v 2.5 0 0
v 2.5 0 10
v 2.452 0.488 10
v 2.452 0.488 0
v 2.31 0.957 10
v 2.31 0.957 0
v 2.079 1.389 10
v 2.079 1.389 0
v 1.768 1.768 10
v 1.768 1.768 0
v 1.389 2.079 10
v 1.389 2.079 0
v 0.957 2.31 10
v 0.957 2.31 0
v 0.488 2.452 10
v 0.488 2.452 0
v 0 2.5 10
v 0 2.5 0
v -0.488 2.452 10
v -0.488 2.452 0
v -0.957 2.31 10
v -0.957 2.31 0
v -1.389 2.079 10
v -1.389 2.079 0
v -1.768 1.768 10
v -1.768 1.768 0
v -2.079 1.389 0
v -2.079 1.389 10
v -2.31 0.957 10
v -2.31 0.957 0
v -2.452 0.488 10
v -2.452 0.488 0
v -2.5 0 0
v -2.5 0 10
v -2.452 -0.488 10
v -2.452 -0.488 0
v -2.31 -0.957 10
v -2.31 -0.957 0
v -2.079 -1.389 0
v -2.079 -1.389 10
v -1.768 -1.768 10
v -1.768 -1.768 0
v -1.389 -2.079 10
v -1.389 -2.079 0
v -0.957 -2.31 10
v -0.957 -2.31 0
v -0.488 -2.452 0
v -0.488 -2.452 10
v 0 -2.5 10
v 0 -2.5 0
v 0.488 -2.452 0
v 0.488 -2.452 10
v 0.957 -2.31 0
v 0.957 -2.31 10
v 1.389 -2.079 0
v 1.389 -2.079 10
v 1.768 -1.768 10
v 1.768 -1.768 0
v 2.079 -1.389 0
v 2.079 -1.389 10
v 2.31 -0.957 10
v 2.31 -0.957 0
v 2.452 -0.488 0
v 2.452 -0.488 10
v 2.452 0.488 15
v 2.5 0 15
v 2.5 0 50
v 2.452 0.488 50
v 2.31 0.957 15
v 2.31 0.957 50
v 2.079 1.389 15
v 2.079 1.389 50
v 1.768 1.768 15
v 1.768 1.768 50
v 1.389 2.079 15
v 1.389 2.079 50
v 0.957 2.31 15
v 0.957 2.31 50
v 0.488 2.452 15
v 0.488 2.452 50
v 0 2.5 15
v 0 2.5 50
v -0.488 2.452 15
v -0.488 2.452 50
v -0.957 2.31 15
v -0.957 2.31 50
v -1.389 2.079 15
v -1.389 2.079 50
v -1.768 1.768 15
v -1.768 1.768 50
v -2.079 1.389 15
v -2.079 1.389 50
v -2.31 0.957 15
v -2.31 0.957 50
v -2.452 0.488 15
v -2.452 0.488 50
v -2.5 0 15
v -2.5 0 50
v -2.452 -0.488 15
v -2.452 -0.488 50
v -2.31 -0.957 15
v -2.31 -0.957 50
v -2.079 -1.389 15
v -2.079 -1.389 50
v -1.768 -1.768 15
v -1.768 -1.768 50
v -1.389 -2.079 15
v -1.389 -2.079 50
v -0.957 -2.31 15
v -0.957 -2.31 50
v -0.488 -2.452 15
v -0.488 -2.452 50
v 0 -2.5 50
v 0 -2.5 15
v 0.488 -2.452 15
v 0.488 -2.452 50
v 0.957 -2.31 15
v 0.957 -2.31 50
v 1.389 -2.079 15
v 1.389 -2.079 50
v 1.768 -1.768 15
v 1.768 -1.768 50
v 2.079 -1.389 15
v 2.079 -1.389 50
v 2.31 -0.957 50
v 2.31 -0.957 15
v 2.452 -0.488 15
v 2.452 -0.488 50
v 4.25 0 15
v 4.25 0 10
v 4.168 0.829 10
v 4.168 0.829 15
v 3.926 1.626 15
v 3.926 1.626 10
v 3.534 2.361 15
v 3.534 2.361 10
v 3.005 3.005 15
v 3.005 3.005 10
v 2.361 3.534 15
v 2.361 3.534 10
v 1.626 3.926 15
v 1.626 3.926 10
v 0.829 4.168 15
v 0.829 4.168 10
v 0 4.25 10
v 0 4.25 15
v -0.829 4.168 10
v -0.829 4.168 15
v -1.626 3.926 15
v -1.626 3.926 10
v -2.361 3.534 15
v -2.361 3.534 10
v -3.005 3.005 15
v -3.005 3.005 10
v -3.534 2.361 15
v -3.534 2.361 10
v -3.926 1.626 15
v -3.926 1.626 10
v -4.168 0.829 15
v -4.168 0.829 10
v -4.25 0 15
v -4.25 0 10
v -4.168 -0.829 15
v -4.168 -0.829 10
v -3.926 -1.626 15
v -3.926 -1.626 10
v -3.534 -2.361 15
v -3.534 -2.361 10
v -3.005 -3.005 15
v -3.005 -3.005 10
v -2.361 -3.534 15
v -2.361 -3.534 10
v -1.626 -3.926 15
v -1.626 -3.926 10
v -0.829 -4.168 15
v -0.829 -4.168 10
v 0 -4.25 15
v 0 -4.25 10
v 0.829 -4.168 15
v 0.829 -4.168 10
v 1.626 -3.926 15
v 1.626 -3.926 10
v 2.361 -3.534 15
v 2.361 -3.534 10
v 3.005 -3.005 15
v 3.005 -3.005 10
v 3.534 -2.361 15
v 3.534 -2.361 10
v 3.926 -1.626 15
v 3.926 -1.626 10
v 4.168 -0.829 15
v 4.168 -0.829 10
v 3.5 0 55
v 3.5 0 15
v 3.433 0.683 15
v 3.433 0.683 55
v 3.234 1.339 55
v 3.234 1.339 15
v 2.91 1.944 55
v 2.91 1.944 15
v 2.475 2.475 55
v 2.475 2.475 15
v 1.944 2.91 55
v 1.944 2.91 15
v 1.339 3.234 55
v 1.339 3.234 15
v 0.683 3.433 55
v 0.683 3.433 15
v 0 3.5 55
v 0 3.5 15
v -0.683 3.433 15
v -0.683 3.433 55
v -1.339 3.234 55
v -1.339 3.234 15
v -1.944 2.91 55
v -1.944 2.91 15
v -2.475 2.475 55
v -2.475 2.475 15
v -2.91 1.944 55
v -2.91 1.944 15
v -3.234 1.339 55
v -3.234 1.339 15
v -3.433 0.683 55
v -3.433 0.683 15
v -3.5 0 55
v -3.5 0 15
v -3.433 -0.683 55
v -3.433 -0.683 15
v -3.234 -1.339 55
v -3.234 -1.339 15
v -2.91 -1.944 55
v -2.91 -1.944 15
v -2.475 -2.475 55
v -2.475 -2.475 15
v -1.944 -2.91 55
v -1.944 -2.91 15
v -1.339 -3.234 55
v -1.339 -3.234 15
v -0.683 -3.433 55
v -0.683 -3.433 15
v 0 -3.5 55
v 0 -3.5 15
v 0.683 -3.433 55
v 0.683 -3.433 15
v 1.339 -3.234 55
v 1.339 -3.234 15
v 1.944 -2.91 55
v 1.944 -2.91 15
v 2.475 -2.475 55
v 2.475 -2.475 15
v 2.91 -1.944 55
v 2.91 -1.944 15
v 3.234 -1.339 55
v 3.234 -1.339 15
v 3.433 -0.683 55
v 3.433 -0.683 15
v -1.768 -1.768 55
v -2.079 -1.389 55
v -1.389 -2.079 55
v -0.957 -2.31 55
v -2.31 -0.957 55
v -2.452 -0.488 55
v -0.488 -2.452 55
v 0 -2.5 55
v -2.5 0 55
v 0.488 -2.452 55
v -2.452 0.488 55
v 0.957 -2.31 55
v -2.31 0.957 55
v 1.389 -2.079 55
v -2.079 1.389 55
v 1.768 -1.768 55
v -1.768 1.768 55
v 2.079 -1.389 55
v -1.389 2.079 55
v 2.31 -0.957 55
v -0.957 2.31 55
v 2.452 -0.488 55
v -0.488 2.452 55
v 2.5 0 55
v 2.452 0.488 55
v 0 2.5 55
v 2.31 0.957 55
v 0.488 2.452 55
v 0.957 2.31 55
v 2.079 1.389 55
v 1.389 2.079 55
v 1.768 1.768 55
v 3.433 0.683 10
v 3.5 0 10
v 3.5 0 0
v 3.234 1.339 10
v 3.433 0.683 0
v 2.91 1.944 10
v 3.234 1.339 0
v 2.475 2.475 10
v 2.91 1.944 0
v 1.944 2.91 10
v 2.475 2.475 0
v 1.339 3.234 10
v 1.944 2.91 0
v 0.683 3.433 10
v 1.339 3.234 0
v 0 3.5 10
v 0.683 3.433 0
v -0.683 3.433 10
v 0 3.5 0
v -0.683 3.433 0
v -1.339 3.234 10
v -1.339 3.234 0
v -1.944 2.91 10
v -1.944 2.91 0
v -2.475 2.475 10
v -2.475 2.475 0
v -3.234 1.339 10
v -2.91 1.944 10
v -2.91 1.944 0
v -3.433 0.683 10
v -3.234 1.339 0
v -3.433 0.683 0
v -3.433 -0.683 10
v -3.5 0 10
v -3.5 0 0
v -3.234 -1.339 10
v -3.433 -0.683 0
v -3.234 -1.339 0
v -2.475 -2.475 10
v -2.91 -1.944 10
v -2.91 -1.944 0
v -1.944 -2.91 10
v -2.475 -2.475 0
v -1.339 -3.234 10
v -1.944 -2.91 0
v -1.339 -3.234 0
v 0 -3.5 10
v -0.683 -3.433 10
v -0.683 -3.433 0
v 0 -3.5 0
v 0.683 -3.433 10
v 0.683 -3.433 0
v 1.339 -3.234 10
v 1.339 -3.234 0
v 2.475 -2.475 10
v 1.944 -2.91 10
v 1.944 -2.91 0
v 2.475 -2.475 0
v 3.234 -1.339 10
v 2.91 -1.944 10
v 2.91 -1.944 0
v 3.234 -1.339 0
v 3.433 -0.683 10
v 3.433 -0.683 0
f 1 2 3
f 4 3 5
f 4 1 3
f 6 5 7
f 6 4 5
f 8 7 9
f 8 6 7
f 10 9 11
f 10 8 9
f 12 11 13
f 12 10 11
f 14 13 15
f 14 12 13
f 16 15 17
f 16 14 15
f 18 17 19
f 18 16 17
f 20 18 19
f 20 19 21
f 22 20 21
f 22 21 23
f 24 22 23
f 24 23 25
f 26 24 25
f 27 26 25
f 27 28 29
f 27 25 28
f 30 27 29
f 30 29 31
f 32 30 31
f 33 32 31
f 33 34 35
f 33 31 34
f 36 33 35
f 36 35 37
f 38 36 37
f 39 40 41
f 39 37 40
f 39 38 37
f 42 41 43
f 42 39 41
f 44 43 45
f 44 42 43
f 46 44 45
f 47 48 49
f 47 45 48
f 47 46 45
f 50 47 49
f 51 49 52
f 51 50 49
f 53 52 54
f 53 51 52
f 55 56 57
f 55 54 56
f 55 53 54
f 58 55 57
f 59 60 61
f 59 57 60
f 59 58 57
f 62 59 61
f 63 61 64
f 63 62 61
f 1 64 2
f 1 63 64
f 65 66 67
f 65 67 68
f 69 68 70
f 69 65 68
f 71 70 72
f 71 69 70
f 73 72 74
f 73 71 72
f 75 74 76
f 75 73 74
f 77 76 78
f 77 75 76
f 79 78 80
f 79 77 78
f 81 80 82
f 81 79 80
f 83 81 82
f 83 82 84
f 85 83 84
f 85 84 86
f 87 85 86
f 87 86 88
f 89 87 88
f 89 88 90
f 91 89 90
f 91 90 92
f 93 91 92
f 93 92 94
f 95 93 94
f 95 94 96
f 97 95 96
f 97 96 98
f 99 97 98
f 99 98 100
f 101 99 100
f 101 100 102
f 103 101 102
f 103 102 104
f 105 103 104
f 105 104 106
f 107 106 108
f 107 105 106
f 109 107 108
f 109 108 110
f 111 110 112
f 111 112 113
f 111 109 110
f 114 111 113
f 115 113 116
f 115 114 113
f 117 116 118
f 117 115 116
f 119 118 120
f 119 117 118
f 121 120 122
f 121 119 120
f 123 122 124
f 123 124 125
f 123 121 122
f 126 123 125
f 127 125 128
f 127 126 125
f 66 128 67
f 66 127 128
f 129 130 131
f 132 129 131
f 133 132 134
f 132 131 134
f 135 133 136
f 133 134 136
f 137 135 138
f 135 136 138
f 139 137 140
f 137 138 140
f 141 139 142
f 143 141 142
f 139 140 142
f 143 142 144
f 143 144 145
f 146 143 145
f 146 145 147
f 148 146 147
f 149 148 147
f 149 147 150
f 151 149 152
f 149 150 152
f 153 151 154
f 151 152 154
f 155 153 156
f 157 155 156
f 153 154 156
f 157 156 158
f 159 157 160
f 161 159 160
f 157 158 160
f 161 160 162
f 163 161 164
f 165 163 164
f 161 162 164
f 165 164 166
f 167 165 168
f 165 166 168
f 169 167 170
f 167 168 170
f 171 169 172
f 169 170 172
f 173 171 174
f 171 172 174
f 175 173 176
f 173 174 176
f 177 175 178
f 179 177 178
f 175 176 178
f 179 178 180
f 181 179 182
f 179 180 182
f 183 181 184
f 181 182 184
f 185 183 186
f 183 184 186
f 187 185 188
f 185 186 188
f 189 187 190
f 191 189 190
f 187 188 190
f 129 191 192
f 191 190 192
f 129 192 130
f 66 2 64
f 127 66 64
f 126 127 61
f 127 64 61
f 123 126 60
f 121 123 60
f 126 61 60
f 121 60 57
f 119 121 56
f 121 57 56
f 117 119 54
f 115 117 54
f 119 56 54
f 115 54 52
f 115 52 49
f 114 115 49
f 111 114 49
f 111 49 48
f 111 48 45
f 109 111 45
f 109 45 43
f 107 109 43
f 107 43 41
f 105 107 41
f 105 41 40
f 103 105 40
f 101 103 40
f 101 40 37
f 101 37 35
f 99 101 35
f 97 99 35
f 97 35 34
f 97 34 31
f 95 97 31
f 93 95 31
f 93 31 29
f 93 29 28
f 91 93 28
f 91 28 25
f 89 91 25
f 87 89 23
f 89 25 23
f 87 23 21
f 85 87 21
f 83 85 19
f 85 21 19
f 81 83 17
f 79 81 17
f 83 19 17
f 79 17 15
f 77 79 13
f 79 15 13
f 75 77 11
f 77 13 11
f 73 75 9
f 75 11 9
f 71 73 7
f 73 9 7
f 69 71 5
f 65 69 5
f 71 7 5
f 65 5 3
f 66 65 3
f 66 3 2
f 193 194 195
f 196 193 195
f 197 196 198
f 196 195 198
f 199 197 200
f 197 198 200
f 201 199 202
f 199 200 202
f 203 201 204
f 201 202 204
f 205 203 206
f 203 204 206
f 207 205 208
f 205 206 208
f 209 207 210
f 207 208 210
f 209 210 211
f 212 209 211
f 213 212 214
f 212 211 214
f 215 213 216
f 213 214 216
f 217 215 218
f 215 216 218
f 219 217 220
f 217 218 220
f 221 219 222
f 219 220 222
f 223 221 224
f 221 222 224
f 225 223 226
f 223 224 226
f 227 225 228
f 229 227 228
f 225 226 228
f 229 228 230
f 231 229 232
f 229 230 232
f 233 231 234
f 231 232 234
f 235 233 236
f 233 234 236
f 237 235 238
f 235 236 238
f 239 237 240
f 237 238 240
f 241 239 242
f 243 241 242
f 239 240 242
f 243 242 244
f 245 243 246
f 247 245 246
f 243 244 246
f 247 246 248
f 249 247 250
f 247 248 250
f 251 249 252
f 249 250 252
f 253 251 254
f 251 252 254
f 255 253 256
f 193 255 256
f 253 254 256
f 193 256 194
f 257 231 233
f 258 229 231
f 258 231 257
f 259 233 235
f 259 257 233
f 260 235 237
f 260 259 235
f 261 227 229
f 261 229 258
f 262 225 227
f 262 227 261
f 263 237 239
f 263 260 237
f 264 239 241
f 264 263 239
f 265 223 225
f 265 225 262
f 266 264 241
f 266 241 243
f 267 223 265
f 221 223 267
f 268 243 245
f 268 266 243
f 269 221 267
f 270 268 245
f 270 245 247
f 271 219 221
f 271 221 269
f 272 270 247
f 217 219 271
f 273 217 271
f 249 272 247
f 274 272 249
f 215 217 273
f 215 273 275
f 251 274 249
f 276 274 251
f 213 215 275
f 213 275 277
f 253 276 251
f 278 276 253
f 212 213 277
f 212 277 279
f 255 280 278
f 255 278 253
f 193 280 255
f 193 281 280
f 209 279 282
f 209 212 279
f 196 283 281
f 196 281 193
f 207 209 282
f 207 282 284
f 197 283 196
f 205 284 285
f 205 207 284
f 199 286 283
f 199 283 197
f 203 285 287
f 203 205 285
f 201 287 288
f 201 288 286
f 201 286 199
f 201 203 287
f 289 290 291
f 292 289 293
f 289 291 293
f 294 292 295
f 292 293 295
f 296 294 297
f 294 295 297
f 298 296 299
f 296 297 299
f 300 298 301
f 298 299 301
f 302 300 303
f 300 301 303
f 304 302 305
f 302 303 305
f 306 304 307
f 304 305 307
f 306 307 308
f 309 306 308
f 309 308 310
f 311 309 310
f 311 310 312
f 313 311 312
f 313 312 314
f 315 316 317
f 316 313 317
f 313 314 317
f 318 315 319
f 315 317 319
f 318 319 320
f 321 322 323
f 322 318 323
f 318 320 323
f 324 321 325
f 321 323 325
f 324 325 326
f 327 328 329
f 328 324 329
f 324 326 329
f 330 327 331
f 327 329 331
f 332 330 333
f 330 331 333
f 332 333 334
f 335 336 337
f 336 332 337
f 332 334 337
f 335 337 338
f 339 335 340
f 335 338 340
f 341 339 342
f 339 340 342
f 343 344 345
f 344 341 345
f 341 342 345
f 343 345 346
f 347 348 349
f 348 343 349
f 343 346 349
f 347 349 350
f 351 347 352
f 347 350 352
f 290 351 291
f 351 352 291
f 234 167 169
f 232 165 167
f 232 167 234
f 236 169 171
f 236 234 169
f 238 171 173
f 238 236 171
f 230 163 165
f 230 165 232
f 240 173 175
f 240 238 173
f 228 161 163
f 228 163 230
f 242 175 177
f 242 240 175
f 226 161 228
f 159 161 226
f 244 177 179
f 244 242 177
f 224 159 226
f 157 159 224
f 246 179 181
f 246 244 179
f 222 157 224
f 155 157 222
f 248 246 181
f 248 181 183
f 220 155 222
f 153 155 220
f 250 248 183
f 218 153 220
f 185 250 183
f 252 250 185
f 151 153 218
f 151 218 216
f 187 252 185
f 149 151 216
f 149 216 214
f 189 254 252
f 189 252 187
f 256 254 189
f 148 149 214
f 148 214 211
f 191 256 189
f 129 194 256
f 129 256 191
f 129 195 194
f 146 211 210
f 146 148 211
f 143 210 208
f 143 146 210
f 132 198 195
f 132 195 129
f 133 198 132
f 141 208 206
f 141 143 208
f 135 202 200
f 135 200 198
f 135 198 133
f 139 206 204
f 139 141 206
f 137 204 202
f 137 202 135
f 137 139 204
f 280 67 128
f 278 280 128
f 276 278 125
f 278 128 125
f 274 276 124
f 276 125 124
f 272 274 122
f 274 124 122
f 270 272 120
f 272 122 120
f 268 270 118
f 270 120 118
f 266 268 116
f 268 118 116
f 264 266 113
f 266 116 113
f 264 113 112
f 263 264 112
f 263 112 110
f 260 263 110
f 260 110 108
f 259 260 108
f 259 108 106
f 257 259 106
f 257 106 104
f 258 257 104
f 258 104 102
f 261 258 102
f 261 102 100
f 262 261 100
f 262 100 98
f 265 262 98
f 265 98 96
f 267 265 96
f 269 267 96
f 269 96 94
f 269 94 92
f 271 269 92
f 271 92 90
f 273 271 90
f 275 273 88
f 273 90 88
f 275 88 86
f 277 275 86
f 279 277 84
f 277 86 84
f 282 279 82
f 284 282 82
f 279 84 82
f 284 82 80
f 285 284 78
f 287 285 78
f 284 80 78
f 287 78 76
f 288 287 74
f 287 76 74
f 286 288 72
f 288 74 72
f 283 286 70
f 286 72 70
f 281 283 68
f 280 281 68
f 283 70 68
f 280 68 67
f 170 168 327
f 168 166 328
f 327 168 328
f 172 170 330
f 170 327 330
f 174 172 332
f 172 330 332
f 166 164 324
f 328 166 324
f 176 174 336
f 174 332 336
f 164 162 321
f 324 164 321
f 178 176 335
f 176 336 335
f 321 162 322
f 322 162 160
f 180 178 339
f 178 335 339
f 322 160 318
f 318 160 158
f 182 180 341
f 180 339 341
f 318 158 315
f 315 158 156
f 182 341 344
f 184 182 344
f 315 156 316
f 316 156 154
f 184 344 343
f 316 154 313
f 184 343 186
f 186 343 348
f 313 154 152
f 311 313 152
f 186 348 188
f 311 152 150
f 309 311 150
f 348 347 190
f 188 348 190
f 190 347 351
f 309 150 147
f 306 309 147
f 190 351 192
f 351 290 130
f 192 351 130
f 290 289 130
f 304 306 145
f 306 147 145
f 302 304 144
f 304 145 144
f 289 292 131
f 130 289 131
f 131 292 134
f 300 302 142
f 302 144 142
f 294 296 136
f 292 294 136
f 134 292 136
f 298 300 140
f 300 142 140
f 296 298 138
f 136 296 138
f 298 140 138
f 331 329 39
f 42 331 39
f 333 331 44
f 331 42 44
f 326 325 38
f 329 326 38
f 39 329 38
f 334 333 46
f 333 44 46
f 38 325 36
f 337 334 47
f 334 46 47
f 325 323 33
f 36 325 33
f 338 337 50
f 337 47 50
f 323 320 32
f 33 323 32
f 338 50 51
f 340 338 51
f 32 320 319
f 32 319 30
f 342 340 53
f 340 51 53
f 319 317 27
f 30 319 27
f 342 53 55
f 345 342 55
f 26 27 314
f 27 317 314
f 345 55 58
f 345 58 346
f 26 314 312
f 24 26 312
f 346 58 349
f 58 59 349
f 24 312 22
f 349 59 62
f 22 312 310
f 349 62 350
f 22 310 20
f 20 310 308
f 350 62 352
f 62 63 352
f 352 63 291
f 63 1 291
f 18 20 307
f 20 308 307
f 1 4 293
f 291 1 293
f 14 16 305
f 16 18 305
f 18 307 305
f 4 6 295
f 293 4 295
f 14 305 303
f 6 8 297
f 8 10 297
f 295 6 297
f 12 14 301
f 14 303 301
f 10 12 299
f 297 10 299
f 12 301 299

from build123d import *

# Parameters (mm, degrees)
IZIM1_R                     = 3.5
IZIM1_R_2                   = 2.5
Y_KSEKLIK_EKSTR_ZYON1_DEPTH = 50
IZIM2_R                     = 3.5
Y_KSEKLIK_EKSTR_ZYON2_DEPTH = 5
IZIM3_R                     = 4.25
Y_KSEKLIK_EKSTR_ZYON3_DEPTH = 5
IZIM5_R                     = 2.5
KES_EKSTR_ZYON1_DEPTH       = 60


with BuildPart() as part:
    # Çizim1 → Yükseklik-Ekstrüzyon1 (new body)
    with BuildSketch(Plane.XY):
        Circle(IZIM1_R)
        Circle(IZIM1_R_2, mode=Mode.SUBTRACT)
    extrude(amount=Y_KSEKLIK_EKSTR_ZYON1_DEPTH)

    # Çizim2 → Yükseklik-Ekstrüzyon2 (add)
    with BuildSketch(Plane.XY.offset(50)):
        Circle(IZIM2_R)
    extrude(amount=Y_KSEKLIK_EKSTR_ZYON2_DEPTH)

    # Çizim3 → Yükseklik-Ekstrüzyon3 (add)
    with BuildSketch(Plane.XY.offset(10)):
        Circle(IZIM3_R)
    extrude(amount=Y_KSEKLIK_EKSTR_ZYON3_DEPTH)

    # Çizim5 → Kes-Ekstrüzyon1 (cut)
    with BuildSketch(Plane(origin=(0, 0, 10), x_dir=(-1, 0, 0), z_dir=(0, 0, -1))):
        with Locations(Location((0, 0, 0), (0, 0, 180))):
            Circle(IZIM5_R)
    extrude(amount=-KES_EKSTR_ZYON1_DEPTH, mode=Mode.SUBTRACT)


solid = part.part
